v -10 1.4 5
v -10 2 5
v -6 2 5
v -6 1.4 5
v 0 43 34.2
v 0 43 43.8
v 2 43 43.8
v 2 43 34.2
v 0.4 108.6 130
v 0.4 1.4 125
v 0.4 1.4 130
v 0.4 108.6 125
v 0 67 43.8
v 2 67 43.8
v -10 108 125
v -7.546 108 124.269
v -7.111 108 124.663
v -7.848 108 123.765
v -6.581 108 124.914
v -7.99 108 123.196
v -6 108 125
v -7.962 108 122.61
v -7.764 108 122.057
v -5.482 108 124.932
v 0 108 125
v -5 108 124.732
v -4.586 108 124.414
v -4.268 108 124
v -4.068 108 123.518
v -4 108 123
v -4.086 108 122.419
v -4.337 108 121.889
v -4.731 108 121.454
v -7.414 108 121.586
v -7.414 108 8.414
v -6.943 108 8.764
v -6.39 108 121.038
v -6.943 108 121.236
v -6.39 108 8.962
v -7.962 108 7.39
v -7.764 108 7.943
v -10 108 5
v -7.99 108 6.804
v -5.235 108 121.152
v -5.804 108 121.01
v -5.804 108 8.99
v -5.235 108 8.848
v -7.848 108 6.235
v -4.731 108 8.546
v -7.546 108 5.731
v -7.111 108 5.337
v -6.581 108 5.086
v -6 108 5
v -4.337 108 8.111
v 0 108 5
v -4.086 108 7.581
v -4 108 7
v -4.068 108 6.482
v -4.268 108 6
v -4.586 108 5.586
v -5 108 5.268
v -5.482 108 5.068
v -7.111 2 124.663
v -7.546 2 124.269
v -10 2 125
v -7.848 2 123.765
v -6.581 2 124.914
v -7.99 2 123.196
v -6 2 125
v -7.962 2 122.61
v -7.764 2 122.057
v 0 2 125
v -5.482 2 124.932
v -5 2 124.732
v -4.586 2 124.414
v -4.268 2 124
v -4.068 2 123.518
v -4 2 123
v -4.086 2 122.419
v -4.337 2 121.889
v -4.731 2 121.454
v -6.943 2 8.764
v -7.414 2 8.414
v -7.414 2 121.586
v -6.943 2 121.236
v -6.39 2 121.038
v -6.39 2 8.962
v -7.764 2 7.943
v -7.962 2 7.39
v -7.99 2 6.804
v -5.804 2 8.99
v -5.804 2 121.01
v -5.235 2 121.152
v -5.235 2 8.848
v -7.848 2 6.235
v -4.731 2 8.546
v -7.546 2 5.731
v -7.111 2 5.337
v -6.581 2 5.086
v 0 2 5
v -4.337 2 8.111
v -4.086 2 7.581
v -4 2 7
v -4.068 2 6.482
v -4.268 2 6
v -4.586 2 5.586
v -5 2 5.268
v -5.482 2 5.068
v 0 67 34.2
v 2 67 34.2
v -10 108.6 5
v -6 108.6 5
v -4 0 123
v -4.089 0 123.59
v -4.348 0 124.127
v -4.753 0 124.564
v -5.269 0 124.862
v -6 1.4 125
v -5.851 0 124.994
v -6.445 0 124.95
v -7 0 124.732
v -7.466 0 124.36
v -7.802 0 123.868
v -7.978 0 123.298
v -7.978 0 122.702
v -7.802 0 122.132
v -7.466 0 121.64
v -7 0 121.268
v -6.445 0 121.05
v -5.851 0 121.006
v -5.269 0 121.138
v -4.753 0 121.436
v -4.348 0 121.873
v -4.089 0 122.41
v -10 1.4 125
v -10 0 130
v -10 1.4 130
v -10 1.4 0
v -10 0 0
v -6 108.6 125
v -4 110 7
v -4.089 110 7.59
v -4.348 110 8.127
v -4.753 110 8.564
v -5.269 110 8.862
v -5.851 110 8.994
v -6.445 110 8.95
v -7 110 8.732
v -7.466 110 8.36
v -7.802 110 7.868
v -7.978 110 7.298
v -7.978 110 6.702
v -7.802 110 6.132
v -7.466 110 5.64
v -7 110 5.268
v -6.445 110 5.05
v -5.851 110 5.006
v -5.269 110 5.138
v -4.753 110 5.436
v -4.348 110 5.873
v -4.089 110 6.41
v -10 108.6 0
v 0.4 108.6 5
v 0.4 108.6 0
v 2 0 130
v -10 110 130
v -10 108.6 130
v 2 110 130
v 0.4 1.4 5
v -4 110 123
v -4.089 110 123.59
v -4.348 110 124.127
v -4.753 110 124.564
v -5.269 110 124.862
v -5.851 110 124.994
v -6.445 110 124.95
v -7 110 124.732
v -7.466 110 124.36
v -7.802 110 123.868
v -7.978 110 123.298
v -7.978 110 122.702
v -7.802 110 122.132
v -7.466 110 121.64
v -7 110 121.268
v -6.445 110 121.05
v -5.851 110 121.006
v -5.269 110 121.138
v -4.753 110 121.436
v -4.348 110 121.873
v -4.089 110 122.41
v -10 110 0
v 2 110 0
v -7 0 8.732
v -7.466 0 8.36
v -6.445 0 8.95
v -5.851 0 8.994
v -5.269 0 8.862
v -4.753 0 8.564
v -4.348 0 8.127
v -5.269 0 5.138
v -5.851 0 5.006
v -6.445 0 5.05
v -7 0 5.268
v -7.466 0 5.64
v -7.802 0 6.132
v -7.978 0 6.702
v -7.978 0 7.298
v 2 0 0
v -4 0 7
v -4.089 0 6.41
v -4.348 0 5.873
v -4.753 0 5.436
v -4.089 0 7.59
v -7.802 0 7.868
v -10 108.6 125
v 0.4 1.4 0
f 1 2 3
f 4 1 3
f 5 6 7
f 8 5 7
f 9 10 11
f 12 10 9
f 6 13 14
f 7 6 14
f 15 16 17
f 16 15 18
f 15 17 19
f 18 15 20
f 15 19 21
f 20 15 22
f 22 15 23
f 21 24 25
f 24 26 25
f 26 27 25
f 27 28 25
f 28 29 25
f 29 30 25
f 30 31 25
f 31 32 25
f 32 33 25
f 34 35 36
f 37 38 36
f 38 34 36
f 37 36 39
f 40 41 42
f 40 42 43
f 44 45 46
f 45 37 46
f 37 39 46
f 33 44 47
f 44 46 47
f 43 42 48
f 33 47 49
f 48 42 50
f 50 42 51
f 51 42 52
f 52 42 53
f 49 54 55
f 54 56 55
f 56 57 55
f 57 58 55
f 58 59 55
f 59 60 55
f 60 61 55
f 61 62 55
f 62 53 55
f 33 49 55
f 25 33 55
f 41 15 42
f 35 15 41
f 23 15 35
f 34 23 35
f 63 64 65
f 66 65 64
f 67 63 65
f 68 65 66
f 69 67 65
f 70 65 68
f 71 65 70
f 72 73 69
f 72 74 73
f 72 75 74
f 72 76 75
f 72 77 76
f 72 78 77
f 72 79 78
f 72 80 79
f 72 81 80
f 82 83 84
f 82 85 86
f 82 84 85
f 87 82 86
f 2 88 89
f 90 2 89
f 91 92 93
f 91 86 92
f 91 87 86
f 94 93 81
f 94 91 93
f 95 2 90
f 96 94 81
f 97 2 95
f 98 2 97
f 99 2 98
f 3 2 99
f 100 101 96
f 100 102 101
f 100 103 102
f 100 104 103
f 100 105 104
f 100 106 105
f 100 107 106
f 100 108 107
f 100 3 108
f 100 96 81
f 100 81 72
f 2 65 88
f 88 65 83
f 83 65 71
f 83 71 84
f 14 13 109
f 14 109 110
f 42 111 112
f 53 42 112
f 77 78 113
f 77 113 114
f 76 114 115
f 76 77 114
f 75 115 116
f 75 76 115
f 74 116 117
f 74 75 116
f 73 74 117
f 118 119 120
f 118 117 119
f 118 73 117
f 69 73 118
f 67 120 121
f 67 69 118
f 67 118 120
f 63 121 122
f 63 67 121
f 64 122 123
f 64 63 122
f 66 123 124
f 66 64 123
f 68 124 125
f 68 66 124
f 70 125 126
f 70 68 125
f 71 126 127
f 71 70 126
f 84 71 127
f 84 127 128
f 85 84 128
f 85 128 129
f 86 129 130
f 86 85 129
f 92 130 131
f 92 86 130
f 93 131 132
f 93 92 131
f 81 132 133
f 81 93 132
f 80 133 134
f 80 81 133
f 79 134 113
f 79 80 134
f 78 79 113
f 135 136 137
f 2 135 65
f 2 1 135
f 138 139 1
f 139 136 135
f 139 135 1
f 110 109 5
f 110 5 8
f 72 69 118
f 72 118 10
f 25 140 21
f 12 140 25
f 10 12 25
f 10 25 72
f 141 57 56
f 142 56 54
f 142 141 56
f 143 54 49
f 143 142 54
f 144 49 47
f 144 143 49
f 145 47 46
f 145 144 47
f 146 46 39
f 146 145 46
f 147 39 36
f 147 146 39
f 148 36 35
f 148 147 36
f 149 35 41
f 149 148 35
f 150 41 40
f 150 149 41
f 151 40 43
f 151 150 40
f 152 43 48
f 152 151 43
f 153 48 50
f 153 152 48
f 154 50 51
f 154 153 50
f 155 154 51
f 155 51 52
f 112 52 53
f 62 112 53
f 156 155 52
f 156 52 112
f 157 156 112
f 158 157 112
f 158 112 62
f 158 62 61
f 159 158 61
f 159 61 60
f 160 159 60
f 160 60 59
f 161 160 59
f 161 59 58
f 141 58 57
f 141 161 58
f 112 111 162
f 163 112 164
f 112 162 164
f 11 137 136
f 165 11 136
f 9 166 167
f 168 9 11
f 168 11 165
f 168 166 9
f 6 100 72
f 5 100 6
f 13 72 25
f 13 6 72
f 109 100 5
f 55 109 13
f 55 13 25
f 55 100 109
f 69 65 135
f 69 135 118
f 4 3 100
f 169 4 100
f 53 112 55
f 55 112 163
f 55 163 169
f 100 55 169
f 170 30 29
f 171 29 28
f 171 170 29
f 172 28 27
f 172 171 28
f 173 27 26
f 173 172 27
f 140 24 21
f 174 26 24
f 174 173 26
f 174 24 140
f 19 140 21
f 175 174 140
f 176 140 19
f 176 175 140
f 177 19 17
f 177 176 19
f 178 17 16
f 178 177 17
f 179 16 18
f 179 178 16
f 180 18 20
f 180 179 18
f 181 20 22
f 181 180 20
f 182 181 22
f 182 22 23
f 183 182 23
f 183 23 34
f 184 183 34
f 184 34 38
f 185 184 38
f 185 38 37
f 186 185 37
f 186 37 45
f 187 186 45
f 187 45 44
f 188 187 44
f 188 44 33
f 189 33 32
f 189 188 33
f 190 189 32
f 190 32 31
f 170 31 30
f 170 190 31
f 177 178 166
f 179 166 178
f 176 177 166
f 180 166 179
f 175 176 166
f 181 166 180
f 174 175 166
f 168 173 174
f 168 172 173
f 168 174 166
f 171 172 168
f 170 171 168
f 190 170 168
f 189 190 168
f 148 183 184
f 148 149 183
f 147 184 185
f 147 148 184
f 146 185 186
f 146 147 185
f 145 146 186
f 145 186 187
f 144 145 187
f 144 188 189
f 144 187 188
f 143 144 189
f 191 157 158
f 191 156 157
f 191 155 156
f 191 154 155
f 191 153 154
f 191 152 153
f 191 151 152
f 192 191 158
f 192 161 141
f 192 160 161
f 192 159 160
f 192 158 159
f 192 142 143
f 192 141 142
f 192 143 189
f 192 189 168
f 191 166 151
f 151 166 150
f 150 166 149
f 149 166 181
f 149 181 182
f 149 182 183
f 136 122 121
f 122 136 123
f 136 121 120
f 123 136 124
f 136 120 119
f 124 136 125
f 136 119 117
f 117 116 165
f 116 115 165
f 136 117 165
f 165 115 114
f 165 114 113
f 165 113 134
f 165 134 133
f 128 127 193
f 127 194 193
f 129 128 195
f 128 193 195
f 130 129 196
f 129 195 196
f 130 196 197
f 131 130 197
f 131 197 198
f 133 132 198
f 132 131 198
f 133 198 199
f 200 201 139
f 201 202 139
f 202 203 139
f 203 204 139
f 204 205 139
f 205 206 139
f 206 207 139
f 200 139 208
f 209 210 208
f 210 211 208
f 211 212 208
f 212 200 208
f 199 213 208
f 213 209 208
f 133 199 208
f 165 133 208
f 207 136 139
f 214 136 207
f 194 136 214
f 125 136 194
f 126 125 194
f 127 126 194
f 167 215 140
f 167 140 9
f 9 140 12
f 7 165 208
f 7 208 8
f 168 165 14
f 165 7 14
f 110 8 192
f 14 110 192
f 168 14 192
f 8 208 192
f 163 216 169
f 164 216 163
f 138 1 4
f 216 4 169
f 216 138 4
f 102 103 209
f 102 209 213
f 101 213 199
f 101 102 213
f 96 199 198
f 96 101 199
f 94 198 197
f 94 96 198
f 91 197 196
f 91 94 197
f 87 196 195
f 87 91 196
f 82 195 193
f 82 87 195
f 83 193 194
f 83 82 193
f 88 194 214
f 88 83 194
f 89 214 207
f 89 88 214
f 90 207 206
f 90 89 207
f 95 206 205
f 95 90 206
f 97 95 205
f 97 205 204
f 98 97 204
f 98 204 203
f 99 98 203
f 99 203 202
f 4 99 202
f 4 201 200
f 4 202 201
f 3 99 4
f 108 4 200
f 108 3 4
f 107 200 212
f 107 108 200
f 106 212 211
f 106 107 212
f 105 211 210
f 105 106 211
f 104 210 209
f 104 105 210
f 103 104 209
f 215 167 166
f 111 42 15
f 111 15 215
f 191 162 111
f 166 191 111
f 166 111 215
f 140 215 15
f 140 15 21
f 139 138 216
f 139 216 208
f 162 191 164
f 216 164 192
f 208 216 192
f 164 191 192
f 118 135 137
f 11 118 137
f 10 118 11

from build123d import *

# Parameters (mm, degrees)
CYLINDER066_R     = 2
CYLINDER066_DEPTH = 10
CYLINDER068_R     = 2
CYLINDER068_DEPTH = 10
CYLINDER067_R     = 2
CYLINDER067_DEPTH = 10
CYLINDER065_R     = 2
CYLINDER065_DEPTH = 10
BOX059_W          = 10
BOX059_H          = 24
BOX059_DEPTH      = 9.6
BOX055_W          = 10.4
BOX055_H          = 107.2
BOX055_DEPTH      = 5
BOX056_W          = 10.4
BOX056_H          = 107.2
BOX056_DEPTH      = 5
BOX054_W          = 10
BOX054_H          = 2
BOX054_DEPTH      = 130
BOX053_W          = 10
BOX053_H          = 2
BOX053_DEPTH      = 130
BOX052_W          = 2
BOX052_H          = 110
BOX052_DEPTH      = 130


with BuildPart() as rueck_loch002:
    # Cylinder066 → Cylinder066 (new body)
    with BuildSketch(Plane(origin=(-6, 5, 123), x_dir=(1, 0, 0), z_dir=(0, -1, 0))):
        Circle(CYLINDER066_R)
    extrude(amount=CYLINDER066_DEPTH)


with BuildPart() as rueck_loch004:
    # Cylinder068 → Cylinder068 (new body)
    with BuildSketch(Plane(origin=(-6, 115, 123), x_dir=(1, 0, 0), z_dir=(0, -1, 0))):
        Circle(CYLINDER068_R)
    extrude(amount=CYLINDER068_DEPTH)


with BuildPart() as rueck_loch003:
    # Cylinder067 → Cylinder067 (new body)
    with BuildSketch(Plane(origin=(-6, 115, 7), x_dir=(1, 0, 0), z_dir=(0, -1, 0))):
        Circle(CYLINDER067_R)
    extrude(amount=CYLINDER067_DEPTH)


with BuildPart() as rueck_loecher:
    # Cylinder065 → Cylinder065 (new body)
    with BuildSketch(Plane(origin=(-6, 5, 7), x_dir=(1, 0, 0), z_dir=(0, -1, 0))):
        Circle(CYLINDER065_R)
    extrude(amount=CYLINDER065_DEPTH)

    # Fusion033: union Rueck_Loch002, Rueck_Loch004, Rueck_Loch003
    add(rueck_loch002.part)
    add(rueck_loch004.part)
    add(rueck_loch003.part)


with BuildPart() as ruecken_loch:
    # Box059 → Box059 (new body)
    with BuildSketch(Plane(origin=(-5, 43, 34.2), x_dir=(1, 0, 0), z_dir=(0, 0, 1))):
        with Locations((5, 12)):
            Rectangle(BOX059_W, BOX059_H)
    extrude(amount=BOX059_DEPTH)


with BuildPart() as cube047:
    # Box055 → Box055 (new body)
    with BuildSketch(Plane(origin=(-10, 1.4, 0), x_dir=(1, 0, 0), z_dir=(0, 0, 1))):
        with Locations((5.2, 53.6)):
            Rectangle(BOX055_W, BOX055_H)
    extrude(amount=BOX055_DEPTH)


with BuildPart() as fusion024:
    # Box056 → Box056 (new body)
    with BuildSketch(Plane(origin=(-10, 1.4, 125), x_dir=(1, 0, 0), z_dir=(0, 0, 1))):
        with Locations((5.2, 53.6)):
            Rectangle(BOX056_W, BOX056_H)
    extrude(amount=BOX056_DEPTH)

    # Fusion024: union Cube047
    add(cube047.part)


with BuildPart() as cube046:
    # Box054 → Box054 (new body)
    with BuildSketch(Plane(origin=(-10, 108, 0), x_dir=(1, 0, 0), z_dir=(0, 0, 1))):
        with Locations((5, 1)):
            Rectangle(BOX054_W, BOX054_H)
    extrude(amount=BOX054_DEPTH)


with BuildPart() as cube045:
    # Box053 → Box053 (new body)
    with BuildSketch(Plane(origin=(-10, 0, 0), x_dir=(1, 0, 0), z_dir=(0, 0, 1))):
        with Locations((5, 1)):
            Rectangle(BOX053_W, BOX053_H)
    extrude(amount=BOX053_DEPTH)


with BuildPart() as ruecken_loch_cut_loecher:
    # Box052 → Box052 (new body)
    with BuildSketch(Plane.XY):
        with Locations((1, 55)):
            Rectangle(BOX052_W, BOX052_H)
    extrude(amount=BOX052_DEPTH)

    # Fusion023: union Cube046, Cube045
    add(cube046.part)
    add(cube045.part)

    # Cut052: cut Fusion024
    add(fusion024.part, mode=Mode.SUBTRACT)

    # Cut054: cut Ruecken_Loch
    add(ruecken_loch.part, mode=Mode.SUBTRACT)

    # Cut062: cut Rueck_Loecher
    add(rueck_loecher.part, mode=Mode.SUBTRACT)


solid = ruecken_loch_cut_loecher.part
